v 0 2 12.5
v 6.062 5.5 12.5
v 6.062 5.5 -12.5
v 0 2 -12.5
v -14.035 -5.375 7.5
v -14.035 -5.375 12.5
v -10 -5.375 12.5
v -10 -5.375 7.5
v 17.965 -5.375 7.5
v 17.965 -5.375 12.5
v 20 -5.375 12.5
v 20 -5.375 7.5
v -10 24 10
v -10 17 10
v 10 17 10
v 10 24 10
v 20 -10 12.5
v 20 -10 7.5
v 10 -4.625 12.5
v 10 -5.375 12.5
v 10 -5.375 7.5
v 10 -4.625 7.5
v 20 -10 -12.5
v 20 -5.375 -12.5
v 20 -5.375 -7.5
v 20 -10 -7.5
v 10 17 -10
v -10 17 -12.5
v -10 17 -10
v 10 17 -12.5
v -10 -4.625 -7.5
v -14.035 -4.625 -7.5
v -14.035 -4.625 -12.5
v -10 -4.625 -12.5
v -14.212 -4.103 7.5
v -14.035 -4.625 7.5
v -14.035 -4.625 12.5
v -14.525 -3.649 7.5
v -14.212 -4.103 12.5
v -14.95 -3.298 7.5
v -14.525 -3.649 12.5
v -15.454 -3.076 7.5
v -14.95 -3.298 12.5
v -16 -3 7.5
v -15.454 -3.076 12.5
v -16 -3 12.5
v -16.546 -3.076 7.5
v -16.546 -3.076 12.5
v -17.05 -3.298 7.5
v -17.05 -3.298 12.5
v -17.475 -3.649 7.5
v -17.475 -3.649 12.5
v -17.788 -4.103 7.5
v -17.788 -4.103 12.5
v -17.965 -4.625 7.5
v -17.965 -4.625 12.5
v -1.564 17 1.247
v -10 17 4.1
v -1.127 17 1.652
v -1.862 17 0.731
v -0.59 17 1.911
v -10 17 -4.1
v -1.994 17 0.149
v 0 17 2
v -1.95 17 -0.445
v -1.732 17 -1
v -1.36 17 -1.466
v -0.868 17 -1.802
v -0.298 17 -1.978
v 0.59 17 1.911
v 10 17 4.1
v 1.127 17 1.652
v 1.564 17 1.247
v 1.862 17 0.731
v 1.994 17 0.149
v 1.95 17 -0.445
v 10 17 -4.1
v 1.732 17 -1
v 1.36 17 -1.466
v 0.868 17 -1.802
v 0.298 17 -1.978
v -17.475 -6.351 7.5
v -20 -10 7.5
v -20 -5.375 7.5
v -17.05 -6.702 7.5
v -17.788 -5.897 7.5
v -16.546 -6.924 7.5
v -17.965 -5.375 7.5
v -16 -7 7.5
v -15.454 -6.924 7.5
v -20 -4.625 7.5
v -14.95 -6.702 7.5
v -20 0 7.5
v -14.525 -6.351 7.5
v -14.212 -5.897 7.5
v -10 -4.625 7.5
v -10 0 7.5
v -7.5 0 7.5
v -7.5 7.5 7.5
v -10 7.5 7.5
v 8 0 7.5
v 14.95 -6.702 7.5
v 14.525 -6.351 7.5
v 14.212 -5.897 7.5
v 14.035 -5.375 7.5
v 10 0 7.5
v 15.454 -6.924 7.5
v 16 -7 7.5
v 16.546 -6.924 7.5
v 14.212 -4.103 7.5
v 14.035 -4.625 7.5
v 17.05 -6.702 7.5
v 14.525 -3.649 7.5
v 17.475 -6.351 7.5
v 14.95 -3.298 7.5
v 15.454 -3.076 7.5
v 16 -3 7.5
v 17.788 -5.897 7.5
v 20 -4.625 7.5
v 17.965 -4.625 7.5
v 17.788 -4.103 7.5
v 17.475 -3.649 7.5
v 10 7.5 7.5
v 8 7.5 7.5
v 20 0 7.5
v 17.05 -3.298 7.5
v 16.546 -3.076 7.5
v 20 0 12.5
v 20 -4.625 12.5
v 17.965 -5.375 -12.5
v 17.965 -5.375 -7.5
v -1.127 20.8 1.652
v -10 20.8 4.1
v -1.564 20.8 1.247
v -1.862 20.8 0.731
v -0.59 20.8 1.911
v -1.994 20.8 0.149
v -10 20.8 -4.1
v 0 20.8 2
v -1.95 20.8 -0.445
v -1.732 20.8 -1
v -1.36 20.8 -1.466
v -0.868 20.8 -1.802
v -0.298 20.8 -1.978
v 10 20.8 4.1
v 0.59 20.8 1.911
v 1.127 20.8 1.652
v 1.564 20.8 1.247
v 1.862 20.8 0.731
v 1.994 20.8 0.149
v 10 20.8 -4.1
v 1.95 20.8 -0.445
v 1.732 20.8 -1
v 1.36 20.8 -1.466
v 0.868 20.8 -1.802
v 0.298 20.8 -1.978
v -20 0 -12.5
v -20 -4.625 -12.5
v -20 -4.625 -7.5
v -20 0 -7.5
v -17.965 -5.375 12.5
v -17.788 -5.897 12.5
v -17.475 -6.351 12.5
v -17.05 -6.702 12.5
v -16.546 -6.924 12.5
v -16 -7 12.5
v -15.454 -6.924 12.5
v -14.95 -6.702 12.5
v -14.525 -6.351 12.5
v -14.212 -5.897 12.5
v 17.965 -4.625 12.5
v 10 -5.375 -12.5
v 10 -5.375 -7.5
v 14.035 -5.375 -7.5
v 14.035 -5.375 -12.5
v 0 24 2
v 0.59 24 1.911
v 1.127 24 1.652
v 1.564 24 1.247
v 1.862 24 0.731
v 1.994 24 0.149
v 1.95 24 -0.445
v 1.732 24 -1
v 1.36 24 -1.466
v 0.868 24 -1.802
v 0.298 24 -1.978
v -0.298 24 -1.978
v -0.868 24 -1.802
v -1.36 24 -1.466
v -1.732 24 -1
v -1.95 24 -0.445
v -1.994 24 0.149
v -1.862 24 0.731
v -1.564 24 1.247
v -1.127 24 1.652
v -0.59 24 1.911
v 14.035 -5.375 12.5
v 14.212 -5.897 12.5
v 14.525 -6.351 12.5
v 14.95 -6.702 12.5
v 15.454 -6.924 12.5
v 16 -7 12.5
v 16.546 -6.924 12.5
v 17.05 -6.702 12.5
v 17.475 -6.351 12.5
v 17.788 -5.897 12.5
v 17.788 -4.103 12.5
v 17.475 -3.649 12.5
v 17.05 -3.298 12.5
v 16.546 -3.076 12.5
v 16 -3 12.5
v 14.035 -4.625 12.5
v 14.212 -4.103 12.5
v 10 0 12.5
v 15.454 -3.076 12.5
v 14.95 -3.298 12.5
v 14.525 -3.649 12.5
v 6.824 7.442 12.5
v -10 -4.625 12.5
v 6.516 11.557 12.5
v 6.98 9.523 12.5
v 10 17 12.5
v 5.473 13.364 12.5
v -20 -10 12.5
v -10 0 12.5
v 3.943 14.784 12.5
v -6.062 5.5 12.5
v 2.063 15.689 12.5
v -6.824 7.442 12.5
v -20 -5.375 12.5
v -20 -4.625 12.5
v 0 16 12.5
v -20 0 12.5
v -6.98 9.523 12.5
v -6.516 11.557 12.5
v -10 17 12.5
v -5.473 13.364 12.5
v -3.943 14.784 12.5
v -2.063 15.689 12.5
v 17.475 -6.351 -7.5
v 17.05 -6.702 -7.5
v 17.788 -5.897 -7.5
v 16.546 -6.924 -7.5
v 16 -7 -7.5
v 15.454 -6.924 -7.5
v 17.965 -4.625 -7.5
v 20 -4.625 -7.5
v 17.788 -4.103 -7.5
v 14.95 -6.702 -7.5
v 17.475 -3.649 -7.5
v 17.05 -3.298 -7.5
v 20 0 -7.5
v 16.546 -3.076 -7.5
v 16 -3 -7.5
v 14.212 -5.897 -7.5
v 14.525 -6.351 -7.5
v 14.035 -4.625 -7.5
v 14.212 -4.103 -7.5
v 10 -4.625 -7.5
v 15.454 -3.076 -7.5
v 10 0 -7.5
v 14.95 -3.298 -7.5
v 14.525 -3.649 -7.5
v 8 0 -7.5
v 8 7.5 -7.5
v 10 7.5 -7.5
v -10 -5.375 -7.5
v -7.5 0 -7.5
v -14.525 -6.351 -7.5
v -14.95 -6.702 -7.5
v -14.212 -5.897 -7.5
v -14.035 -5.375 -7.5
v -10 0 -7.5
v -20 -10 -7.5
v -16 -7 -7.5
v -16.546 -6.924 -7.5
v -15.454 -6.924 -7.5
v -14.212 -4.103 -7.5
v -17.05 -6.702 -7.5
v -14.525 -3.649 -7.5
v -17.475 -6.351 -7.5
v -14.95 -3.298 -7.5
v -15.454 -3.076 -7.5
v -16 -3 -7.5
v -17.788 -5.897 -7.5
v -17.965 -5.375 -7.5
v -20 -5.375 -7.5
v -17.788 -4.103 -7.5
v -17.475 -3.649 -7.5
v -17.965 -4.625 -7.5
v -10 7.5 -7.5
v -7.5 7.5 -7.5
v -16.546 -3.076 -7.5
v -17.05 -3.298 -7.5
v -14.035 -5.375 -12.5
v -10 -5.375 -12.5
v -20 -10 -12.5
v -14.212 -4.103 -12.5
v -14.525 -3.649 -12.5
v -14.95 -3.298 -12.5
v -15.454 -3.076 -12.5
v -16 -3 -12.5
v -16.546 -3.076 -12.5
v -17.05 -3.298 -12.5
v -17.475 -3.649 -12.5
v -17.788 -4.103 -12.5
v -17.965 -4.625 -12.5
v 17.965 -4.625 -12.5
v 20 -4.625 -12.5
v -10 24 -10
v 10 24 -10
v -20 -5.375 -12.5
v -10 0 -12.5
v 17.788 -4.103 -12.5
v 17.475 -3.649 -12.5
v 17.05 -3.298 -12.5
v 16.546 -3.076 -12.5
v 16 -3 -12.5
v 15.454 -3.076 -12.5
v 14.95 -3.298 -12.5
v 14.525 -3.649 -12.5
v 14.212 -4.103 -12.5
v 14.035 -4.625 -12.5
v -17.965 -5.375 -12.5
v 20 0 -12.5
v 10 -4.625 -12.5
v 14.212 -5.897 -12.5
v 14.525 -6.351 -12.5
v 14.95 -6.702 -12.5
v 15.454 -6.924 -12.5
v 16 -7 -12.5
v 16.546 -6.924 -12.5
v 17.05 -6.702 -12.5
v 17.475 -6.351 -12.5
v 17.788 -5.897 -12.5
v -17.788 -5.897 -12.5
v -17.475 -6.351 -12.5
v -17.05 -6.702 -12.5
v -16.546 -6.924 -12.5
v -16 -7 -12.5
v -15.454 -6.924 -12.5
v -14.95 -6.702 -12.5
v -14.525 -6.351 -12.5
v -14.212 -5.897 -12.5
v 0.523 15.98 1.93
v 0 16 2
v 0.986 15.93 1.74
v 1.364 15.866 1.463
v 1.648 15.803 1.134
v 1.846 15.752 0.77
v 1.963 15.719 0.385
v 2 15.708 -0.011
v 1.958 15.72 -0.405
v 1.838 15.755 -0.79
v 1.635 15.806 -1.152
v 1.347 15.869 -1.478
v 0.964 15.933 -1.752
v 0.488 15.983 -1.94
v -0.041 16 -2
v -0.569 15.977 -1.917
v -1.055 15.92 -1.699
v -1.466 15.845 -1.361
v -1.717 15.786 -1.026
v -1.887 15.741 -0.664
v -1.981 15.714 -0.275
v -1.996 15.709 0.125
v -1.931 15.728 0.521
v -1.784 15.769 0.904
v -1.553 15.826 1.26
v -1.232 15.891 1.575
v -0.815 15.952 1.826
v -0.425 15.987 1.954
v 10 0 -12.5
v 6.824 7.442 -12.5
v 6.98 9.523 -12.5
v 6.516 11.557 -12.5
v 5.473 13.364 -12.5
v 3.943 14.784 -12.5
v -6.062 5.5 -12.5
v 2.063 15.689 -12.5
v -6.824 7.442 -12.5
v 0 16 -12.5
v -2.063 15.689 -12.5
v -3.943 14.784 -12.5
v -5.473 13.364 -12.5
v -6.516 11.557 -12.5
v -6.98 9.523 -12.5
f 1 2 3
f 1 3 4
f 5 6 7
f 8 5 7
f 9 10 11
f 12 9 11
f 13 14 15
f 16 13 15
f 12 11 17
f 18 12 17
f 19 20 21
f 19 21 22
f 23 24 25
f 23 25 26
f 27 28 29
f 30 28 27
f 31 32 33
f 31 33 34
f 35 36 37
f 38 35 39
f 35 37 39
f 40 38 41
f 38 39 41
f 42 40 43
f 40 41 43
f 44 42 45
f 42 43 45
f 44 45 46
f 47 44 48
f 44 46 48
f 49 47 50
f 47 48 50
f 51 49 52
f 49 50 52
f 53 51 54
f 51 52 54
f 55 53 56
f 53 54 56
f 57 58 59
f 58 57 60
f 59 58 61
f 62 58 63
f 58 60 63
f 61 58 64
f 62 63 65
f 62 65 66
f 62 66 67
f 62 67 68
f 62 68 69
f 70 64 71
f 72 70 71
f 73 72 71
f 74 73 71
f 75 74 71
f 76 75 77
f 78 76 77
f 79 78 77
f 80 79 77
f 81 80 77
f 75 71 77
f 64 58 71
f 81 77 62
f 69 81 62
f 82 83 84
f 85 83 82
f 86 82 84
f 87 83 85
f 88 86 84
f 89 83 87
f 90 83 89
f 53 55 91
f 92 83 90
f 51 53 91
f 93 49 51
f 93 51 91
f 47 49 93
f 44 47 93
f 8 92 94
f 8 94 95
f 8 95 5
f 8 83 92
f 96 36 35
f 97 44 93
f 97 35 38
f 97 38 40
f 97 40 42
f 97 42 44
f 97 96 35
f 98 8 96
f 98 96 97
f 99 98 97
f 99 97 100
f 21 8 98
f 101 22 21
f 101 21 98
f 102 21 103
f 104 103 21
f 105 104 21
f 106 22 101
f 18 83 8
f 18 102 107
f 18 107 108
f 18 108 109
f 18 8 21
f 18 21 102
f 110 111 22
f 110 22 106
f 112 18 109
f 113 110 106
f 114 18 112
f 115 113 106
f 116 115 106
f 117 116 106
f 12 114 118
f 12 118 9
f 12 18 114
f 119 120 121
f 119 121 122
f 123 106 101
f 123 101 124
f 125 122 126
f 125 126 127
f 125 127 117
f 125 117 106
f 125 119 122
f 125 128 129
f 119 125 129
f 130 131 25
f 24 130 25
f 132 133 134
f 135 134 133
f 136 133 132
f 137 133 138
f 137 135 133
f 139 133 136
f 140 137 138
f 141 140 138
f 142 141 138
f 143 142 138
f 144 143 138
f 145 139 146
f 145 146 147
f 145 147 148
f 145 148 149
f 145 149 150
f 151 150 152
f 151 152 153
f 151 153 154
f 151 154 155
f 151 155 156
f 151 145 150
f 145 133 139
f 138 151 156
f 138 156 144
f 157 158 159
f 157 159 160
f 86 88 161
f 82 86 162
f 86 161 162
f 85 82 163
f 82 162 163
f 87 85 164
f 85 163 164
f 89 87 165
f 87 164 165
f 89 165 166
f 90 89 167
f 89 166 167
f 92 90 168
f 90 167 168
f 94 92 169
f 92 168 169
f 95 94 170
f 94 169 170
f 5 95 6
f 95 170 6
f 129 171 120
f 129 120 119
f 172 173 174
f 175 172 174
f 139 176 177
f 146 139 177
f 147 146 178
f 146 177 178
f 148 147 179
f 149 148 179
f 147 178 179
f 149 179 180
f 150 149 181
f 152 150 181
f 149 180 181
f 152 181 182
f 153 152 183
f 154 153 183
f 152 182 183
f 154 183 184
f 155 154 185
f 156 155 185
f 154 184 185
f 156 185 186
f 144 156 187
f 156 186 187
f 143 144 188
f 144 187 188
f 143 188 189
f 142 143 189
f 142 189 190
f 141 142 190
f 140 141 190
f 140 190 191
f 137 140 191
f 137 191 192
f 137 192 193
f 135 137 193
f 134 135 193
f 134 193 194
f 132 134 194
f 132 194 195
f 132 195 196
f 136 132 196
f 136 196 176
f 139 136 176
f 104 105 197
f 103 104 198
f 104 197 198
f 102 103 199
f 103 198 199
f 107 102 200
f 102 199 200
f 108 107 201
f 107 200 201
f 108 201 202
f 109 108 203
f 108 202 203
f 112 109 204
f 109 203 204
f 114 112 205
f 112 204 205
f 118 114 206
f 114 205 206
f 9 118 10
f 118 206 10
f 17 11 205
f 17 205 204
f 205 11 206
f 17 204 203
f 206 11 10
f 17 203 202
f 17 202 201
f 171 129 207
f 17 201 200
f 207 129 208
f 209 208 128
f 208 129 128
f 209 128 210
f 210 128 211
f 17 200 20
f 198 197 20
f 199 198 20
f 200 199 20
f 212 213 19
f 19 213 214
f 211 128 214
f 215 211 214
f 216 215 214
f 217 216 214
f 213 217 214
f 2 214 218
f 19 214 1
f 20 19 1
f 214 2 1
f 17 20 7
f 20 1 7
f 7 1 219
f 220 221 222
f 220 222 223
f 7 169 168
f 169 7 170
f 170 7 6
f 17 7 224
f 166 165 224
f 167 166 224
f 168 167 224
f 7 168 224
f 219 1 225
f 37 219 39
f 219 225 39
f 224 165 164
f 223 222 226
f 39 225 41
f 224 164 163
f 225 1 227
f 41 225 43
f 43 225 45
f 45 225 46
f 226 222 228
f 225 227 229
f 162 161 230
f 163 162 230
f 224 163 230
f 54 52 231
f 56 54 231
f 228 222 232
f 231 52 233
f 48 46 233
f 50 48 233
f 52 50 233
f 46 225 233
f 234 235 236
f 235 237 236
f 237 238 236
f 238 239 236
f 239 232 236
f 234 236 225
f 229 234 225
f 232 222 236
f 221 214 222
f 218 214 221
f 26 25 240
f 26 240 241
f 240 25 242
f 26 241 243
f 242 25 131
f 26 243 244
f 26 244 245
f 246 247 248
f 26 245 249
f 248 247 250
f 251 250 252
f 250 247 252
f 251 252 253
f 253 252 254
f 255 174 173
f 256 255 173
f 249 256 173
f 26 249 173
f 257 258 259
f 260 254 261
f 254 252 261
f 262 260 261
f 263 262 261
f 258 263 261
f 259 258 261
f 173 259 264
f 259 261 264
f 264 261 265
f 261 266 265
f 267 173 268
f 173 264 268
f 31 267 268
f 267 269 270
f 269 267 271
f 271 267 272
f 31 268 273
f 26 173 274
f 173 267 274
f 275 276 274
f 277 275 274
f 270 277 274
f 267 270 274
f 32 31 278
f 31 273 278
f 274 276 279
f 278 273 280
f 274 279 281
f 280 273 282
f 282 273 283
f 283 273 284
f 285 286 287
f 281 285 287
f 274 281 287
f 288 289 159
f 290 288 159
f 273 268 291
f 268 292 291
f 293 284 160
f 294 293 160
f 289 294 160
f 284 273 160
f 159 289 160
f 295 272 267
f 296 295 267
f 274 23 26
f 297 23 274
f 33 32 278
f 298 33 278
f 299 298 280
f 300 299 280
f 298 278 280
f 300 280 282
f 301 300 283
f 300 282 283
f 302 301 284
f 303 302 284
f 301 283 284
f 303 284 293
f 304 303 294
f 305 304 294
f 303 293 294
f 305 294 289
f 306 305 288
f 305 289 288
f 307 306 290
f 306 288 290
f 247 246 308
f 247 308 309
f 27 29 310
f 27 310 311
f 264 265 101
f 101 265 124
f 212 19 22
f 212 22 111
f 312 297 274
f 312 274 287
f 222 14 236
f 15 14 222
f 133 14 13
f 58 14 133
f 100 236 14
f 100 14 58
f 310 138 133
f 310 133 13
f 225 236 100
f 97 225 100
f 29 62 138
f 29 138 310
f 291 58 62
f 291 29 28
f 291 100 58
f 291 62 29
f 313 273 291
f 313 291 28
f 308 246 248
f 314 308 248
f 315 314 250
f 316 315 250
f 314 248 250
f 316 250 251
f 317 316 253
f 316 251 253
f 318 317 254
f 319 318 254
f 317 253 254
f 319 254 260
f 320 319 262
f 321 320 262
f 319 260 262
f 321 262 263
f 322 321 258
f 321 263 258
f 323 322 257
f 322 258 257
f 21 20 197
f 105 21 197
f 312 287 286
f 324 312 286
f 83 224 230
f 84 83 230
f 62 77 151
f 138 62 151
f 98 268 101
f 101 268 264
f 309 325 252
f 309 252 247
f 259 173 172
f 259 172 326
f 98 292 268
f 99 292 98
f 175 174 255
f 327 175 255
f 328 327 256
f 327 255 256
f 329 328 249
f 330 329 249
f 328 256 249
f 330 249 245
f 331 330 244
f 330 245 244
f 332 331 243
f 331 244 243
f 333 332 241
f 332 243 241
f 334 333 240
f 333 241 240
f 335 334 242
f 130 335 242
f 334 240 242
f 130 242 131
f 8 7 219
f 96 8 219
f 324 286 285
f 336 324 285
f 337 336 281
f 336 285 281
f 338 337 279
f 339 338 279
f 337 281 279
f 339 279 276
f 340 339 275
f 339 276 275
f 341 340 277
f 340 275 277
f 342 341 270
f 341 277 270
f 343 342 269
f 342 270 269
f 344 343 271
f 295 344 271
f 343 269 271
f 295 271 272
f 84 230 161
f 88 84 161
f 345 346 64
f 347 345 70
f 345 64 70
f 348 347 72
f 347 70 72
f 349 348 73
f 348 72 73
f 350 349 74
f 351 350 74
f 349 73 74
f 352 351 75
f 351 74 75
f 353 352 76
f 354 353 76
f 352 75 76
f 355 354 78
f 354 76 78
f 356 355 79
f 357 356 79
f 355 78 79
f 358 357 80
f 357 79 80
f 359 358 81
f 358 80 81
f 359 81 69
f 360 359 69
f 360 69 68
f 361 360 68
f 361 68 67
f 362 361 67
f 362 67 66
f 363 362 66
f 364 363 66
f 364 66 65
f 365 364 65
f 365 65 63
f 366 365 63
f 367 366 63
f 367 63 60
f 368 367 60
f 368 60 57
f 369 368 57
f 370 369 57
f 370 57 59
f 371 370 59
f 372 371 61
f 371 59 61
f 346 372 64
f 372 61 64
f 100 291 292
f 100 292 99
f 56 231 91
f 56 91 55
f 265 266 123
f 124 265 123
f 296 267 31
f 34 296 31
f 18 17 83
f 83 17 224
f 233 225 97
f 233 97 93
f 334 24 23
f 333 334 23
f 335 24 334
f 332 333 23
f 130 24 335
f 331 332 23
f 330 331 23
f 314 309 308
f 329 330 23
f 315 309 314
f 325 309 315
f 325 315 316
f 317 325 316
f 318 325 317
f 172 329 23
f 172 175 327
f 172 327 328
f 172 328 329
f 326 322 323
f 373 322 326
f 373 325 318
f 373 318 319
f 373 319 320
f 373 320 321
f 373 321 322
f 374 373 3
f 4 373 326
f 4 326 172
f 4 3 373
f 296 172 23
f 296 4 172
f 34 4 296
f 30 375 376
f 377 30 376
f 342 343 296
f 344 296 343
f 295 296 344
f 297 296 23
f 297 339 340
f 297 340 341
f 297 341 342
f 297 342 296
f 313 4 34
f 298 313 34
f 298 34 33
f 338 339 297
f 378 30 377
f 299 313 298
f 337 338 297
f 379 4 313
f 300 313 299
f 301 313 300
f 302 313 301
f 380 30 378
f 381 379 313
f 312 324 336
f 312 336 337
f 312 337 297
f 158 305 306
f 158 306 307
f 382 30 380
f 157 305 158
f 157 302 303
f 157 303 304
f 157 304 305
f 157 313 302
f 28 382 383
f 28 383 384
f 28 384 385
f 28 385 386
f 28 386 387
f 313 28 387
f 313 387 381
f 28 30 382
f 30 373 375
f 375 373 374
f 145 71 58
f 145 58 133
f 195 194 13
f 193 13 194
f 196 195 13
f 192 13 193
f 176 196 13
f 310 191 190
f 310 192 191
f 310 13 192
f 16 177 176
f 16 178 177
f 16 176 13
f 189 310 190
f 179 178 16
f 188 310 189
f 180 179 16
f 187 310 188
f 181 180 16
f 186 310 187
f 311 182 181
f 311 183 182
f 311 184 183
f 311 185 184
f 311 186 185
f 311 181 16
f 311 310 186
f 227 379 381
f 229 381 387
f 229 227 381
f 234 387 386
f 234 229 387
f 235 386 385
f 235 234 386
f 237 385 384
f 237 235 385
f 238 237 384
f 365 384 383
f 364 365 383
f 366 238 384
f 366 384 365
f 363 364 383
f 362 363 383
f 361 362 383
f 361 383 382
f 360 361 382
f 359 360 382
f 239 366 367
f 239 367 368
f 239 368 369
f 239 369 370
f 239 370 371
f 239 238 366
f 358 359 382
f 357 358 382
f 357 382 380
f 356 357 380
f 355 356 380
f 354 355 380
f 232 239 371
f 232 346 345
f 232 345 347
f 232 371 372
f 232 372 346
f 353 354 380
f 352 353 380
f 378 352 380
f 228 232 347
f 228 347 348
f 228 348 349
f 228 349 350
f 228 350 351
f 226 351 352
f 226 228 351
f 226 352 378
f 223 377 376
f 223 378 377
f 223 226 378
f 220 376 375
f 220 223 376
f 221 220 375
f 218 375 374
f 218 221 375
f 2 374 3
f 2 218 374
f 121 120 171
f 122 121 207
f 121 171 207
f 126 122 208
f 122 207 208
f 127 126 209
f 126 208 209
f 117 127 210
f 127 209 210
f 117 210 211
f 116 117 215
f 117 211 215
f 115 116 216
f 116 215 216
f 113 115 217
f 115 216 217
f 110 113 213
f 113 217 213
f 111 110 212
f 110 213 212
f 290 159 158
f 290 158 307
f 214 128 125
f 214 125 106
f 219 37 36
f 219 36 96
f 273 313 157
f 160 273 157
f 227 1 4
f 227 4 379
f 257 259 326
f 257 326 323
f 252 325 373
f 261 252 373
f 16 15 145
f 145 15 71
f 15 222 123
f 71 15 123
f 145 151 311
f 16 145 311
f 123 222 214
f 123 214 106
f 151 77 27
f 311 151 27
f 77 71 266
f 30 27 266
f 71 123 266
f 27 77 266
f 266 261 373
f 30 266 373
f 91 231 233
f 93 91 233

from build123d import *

# Parameters (mm, degrees)
SKETCH1_W               = 20
SKETCH1_H               = 25
BOSS_EXTRUDE1_DEPTH     = 17
CUT_EXTRUDE1_DEPTH      = 32.843366656
BOSS_EXTRUDE2_DEPTH     = 5
SKETCH4_R               = 2
CUT_EXTRUDE2_DEPTH      = 37.249137921
SKETCH6_W               = 20
SKETCH6_H               = 20
BOSS_EXTRUDE3_DEPTH     = 7
SKETCH8_W               = 8.2
SKETCH8_H               = 3.8
CUT_EXTRUDE3_DEPTH      = 41.401113846
CUT_EXTRUDE4_REACH      = 43.379
CUT_EXTRUDE4_END_RADIUS = 7
SKETCH7_R               = 2
SKETCH9_W               = 15
SKETCH9_H               = 7.5
CUT_EXTRUDE5_DEPTH      = 2
SKETCH10_W              = 10
SKETCH10_H              = 0.75
CUT_EXTRUDE6_DEPTH      = 41.01249811
CUT_EXTRUDE7_START      = 20
SKETCH9_2_W             = 15
SKETCH9_2_H             = 7.5
CUT_EXTRUDE7_DEPTH      = 2.5


with BuildPart() as part:
    # Sketch1 → Boss-Extrude1 (new body)
    with BuildSketch(Plane(origin=(0, 0, 0), x_dir=(1, 0, 0), z_dir=(0, 1, 0))):
        Rectangle(SKETCH1_W, SKETCH1_H)
    extrude(amount=BOSS_EXTRUDE1_DEPTH)

    # Sketch2 → Cut-Extrude1 (cut, through all)
    with BuildSketch(Plane.XY.offset(12.5)):
        with BuildLine():
            Line((0, 2), (-6.062177826, 5.5))
            ThreePointArc((-6.062177826, 5.5), (0, 16), (6.062177826, 5.5))
            Line((6.062177826, 5.5), (0, 2))
        make_face()
    extrude(amount=-CUT_EXTRUDE1_DEPTH, mode=Mode.SUBTRACT)

    # Sketch3 → Boss-Extrude2 (add)
    with BuildSketch(Plane.XY.offset(12.5)):
        Polygon((10, 0), (20, 0), (20, -10), (-20, -10), (-20, 0), (-10, 0), align=None)
    boss_extrude2 = extrude(amount=-BOSS_EXTRUDE2_DEPTH)

    # Mirror1: Boss-Extrude2 across plane
    add(boss_extrude2.mirror(Plane.XY))

    # Sketch4 → Cut-Extrude2 (cut, through all)
    with BuildSketch(Plane.XY.offset(12.5)):
        with Locations((16, -5)):
            Circle(SKETCH4_R)
        with Locations((-16, -5)):
            Circle(SKETCH4_R)
    extrude(amount=-CUT_EXTRUDE2_DEPTH, mode=Mode.SUBTRACT)

    # Sketch6 → Boss-Extrude3 (add)
    with BuildSketch(Plane(origin=(0, 17, 0), x_dir=(1, 0, 0), z_dir=(0, 1, 0))):
        Rectangle(SKETCH6_W, SKETCH6_H)
    extrude(amount=BOSS_EXTRUDE3_DEPTH)

    # Sketch8 → Cut-Extrude3 (cut, through all)
    with BuildSketch(Plane(origin=(10, 0, 0), x_dir=(0, 0, -1), z_dir=(1, 0, 0))):
        with Locations((0, 18.9)):
            Rectangle(SKETCH8_W, SKETCH8_H)
    extrude(amount=-CUT_EXTRUDE3_DEPTH, mode=Mode.SUBTRACT)

    # Cut-Extrude4: up to this cylinder (the profile starts outside it)
    cut_extrude4_end = Plane(origin=(0, 9, 0), z_dir=(0, 0, 1)) * Cylinder(CUT_EXTRUDE4_END_RADIUS, 101.758, mode=Mode.PRIVATE)
    # Sketch7 → Cut-Extrude4 (cut, up to the surface)
    with BuildSketch(Plane(origin=(0, 24, 0), x_dir=(1, 0, 0), z_dir=(0, 1, 0)), mode=Mode.PRIVATE) as cut_extrude4_sk1:
        with Locations(Location((0, 0, 0), (0, 0, 270))):
            Circle(SKETCH7_R)
    cut_extrude4_tool1 = extrude(cut_extrude4_sk1.sketch, amount=-CUT_EXTRUDE4_REACH, mode=Mode.PRIVATE) - cut_extrude4_end
    add(cut_extrude4_tool1.solids().sort_by_distance((0, 24, 0))[0], mode=Mode.SUBTRACT)

    # Sketch9 → Cut-Extrude5 (cut)
    with BuildSketch(Plane.ZY.offset(-10)):
        with Locations((0, 3.75)):
            Rectangle(SKETCH9_W, SKETCH9_H)
    extrude(amount=CUT_EXTRUDE5_DEPTH, mode=Mode.SUBTRACT)

    # Sketch10 → Cut-Extrude6 (cut, through all)
    with BuildSketch(Plane.XY.offset(12.5)):
        with Locations((-15, -5)):
            Rectangle(SKETCH10_W, SKETCH10_H)
        with Locations((15, -5)):
            Rectangle(SKETCH10_W, SKETCH10_H)
    extrude(amount=-CUT_EXTRUDE6_DEPTH, mode=Mode.SUBTRACT)

    # Sketch9<2> → Cut-Extrude7 (cut)
    with BuildSketch(Plane.ZY.offset(-10).offset(CUT_EXTRUDE7_START)):
        with Locations((0, 3.75)):
            Rectangle(SKETCH9_2_W, SKETCH9_2_H)
    extrude(amount=-CUT_EXTRUDE7_DEPTH, mode=Mode.SUBTRACT)


solid = part.part
